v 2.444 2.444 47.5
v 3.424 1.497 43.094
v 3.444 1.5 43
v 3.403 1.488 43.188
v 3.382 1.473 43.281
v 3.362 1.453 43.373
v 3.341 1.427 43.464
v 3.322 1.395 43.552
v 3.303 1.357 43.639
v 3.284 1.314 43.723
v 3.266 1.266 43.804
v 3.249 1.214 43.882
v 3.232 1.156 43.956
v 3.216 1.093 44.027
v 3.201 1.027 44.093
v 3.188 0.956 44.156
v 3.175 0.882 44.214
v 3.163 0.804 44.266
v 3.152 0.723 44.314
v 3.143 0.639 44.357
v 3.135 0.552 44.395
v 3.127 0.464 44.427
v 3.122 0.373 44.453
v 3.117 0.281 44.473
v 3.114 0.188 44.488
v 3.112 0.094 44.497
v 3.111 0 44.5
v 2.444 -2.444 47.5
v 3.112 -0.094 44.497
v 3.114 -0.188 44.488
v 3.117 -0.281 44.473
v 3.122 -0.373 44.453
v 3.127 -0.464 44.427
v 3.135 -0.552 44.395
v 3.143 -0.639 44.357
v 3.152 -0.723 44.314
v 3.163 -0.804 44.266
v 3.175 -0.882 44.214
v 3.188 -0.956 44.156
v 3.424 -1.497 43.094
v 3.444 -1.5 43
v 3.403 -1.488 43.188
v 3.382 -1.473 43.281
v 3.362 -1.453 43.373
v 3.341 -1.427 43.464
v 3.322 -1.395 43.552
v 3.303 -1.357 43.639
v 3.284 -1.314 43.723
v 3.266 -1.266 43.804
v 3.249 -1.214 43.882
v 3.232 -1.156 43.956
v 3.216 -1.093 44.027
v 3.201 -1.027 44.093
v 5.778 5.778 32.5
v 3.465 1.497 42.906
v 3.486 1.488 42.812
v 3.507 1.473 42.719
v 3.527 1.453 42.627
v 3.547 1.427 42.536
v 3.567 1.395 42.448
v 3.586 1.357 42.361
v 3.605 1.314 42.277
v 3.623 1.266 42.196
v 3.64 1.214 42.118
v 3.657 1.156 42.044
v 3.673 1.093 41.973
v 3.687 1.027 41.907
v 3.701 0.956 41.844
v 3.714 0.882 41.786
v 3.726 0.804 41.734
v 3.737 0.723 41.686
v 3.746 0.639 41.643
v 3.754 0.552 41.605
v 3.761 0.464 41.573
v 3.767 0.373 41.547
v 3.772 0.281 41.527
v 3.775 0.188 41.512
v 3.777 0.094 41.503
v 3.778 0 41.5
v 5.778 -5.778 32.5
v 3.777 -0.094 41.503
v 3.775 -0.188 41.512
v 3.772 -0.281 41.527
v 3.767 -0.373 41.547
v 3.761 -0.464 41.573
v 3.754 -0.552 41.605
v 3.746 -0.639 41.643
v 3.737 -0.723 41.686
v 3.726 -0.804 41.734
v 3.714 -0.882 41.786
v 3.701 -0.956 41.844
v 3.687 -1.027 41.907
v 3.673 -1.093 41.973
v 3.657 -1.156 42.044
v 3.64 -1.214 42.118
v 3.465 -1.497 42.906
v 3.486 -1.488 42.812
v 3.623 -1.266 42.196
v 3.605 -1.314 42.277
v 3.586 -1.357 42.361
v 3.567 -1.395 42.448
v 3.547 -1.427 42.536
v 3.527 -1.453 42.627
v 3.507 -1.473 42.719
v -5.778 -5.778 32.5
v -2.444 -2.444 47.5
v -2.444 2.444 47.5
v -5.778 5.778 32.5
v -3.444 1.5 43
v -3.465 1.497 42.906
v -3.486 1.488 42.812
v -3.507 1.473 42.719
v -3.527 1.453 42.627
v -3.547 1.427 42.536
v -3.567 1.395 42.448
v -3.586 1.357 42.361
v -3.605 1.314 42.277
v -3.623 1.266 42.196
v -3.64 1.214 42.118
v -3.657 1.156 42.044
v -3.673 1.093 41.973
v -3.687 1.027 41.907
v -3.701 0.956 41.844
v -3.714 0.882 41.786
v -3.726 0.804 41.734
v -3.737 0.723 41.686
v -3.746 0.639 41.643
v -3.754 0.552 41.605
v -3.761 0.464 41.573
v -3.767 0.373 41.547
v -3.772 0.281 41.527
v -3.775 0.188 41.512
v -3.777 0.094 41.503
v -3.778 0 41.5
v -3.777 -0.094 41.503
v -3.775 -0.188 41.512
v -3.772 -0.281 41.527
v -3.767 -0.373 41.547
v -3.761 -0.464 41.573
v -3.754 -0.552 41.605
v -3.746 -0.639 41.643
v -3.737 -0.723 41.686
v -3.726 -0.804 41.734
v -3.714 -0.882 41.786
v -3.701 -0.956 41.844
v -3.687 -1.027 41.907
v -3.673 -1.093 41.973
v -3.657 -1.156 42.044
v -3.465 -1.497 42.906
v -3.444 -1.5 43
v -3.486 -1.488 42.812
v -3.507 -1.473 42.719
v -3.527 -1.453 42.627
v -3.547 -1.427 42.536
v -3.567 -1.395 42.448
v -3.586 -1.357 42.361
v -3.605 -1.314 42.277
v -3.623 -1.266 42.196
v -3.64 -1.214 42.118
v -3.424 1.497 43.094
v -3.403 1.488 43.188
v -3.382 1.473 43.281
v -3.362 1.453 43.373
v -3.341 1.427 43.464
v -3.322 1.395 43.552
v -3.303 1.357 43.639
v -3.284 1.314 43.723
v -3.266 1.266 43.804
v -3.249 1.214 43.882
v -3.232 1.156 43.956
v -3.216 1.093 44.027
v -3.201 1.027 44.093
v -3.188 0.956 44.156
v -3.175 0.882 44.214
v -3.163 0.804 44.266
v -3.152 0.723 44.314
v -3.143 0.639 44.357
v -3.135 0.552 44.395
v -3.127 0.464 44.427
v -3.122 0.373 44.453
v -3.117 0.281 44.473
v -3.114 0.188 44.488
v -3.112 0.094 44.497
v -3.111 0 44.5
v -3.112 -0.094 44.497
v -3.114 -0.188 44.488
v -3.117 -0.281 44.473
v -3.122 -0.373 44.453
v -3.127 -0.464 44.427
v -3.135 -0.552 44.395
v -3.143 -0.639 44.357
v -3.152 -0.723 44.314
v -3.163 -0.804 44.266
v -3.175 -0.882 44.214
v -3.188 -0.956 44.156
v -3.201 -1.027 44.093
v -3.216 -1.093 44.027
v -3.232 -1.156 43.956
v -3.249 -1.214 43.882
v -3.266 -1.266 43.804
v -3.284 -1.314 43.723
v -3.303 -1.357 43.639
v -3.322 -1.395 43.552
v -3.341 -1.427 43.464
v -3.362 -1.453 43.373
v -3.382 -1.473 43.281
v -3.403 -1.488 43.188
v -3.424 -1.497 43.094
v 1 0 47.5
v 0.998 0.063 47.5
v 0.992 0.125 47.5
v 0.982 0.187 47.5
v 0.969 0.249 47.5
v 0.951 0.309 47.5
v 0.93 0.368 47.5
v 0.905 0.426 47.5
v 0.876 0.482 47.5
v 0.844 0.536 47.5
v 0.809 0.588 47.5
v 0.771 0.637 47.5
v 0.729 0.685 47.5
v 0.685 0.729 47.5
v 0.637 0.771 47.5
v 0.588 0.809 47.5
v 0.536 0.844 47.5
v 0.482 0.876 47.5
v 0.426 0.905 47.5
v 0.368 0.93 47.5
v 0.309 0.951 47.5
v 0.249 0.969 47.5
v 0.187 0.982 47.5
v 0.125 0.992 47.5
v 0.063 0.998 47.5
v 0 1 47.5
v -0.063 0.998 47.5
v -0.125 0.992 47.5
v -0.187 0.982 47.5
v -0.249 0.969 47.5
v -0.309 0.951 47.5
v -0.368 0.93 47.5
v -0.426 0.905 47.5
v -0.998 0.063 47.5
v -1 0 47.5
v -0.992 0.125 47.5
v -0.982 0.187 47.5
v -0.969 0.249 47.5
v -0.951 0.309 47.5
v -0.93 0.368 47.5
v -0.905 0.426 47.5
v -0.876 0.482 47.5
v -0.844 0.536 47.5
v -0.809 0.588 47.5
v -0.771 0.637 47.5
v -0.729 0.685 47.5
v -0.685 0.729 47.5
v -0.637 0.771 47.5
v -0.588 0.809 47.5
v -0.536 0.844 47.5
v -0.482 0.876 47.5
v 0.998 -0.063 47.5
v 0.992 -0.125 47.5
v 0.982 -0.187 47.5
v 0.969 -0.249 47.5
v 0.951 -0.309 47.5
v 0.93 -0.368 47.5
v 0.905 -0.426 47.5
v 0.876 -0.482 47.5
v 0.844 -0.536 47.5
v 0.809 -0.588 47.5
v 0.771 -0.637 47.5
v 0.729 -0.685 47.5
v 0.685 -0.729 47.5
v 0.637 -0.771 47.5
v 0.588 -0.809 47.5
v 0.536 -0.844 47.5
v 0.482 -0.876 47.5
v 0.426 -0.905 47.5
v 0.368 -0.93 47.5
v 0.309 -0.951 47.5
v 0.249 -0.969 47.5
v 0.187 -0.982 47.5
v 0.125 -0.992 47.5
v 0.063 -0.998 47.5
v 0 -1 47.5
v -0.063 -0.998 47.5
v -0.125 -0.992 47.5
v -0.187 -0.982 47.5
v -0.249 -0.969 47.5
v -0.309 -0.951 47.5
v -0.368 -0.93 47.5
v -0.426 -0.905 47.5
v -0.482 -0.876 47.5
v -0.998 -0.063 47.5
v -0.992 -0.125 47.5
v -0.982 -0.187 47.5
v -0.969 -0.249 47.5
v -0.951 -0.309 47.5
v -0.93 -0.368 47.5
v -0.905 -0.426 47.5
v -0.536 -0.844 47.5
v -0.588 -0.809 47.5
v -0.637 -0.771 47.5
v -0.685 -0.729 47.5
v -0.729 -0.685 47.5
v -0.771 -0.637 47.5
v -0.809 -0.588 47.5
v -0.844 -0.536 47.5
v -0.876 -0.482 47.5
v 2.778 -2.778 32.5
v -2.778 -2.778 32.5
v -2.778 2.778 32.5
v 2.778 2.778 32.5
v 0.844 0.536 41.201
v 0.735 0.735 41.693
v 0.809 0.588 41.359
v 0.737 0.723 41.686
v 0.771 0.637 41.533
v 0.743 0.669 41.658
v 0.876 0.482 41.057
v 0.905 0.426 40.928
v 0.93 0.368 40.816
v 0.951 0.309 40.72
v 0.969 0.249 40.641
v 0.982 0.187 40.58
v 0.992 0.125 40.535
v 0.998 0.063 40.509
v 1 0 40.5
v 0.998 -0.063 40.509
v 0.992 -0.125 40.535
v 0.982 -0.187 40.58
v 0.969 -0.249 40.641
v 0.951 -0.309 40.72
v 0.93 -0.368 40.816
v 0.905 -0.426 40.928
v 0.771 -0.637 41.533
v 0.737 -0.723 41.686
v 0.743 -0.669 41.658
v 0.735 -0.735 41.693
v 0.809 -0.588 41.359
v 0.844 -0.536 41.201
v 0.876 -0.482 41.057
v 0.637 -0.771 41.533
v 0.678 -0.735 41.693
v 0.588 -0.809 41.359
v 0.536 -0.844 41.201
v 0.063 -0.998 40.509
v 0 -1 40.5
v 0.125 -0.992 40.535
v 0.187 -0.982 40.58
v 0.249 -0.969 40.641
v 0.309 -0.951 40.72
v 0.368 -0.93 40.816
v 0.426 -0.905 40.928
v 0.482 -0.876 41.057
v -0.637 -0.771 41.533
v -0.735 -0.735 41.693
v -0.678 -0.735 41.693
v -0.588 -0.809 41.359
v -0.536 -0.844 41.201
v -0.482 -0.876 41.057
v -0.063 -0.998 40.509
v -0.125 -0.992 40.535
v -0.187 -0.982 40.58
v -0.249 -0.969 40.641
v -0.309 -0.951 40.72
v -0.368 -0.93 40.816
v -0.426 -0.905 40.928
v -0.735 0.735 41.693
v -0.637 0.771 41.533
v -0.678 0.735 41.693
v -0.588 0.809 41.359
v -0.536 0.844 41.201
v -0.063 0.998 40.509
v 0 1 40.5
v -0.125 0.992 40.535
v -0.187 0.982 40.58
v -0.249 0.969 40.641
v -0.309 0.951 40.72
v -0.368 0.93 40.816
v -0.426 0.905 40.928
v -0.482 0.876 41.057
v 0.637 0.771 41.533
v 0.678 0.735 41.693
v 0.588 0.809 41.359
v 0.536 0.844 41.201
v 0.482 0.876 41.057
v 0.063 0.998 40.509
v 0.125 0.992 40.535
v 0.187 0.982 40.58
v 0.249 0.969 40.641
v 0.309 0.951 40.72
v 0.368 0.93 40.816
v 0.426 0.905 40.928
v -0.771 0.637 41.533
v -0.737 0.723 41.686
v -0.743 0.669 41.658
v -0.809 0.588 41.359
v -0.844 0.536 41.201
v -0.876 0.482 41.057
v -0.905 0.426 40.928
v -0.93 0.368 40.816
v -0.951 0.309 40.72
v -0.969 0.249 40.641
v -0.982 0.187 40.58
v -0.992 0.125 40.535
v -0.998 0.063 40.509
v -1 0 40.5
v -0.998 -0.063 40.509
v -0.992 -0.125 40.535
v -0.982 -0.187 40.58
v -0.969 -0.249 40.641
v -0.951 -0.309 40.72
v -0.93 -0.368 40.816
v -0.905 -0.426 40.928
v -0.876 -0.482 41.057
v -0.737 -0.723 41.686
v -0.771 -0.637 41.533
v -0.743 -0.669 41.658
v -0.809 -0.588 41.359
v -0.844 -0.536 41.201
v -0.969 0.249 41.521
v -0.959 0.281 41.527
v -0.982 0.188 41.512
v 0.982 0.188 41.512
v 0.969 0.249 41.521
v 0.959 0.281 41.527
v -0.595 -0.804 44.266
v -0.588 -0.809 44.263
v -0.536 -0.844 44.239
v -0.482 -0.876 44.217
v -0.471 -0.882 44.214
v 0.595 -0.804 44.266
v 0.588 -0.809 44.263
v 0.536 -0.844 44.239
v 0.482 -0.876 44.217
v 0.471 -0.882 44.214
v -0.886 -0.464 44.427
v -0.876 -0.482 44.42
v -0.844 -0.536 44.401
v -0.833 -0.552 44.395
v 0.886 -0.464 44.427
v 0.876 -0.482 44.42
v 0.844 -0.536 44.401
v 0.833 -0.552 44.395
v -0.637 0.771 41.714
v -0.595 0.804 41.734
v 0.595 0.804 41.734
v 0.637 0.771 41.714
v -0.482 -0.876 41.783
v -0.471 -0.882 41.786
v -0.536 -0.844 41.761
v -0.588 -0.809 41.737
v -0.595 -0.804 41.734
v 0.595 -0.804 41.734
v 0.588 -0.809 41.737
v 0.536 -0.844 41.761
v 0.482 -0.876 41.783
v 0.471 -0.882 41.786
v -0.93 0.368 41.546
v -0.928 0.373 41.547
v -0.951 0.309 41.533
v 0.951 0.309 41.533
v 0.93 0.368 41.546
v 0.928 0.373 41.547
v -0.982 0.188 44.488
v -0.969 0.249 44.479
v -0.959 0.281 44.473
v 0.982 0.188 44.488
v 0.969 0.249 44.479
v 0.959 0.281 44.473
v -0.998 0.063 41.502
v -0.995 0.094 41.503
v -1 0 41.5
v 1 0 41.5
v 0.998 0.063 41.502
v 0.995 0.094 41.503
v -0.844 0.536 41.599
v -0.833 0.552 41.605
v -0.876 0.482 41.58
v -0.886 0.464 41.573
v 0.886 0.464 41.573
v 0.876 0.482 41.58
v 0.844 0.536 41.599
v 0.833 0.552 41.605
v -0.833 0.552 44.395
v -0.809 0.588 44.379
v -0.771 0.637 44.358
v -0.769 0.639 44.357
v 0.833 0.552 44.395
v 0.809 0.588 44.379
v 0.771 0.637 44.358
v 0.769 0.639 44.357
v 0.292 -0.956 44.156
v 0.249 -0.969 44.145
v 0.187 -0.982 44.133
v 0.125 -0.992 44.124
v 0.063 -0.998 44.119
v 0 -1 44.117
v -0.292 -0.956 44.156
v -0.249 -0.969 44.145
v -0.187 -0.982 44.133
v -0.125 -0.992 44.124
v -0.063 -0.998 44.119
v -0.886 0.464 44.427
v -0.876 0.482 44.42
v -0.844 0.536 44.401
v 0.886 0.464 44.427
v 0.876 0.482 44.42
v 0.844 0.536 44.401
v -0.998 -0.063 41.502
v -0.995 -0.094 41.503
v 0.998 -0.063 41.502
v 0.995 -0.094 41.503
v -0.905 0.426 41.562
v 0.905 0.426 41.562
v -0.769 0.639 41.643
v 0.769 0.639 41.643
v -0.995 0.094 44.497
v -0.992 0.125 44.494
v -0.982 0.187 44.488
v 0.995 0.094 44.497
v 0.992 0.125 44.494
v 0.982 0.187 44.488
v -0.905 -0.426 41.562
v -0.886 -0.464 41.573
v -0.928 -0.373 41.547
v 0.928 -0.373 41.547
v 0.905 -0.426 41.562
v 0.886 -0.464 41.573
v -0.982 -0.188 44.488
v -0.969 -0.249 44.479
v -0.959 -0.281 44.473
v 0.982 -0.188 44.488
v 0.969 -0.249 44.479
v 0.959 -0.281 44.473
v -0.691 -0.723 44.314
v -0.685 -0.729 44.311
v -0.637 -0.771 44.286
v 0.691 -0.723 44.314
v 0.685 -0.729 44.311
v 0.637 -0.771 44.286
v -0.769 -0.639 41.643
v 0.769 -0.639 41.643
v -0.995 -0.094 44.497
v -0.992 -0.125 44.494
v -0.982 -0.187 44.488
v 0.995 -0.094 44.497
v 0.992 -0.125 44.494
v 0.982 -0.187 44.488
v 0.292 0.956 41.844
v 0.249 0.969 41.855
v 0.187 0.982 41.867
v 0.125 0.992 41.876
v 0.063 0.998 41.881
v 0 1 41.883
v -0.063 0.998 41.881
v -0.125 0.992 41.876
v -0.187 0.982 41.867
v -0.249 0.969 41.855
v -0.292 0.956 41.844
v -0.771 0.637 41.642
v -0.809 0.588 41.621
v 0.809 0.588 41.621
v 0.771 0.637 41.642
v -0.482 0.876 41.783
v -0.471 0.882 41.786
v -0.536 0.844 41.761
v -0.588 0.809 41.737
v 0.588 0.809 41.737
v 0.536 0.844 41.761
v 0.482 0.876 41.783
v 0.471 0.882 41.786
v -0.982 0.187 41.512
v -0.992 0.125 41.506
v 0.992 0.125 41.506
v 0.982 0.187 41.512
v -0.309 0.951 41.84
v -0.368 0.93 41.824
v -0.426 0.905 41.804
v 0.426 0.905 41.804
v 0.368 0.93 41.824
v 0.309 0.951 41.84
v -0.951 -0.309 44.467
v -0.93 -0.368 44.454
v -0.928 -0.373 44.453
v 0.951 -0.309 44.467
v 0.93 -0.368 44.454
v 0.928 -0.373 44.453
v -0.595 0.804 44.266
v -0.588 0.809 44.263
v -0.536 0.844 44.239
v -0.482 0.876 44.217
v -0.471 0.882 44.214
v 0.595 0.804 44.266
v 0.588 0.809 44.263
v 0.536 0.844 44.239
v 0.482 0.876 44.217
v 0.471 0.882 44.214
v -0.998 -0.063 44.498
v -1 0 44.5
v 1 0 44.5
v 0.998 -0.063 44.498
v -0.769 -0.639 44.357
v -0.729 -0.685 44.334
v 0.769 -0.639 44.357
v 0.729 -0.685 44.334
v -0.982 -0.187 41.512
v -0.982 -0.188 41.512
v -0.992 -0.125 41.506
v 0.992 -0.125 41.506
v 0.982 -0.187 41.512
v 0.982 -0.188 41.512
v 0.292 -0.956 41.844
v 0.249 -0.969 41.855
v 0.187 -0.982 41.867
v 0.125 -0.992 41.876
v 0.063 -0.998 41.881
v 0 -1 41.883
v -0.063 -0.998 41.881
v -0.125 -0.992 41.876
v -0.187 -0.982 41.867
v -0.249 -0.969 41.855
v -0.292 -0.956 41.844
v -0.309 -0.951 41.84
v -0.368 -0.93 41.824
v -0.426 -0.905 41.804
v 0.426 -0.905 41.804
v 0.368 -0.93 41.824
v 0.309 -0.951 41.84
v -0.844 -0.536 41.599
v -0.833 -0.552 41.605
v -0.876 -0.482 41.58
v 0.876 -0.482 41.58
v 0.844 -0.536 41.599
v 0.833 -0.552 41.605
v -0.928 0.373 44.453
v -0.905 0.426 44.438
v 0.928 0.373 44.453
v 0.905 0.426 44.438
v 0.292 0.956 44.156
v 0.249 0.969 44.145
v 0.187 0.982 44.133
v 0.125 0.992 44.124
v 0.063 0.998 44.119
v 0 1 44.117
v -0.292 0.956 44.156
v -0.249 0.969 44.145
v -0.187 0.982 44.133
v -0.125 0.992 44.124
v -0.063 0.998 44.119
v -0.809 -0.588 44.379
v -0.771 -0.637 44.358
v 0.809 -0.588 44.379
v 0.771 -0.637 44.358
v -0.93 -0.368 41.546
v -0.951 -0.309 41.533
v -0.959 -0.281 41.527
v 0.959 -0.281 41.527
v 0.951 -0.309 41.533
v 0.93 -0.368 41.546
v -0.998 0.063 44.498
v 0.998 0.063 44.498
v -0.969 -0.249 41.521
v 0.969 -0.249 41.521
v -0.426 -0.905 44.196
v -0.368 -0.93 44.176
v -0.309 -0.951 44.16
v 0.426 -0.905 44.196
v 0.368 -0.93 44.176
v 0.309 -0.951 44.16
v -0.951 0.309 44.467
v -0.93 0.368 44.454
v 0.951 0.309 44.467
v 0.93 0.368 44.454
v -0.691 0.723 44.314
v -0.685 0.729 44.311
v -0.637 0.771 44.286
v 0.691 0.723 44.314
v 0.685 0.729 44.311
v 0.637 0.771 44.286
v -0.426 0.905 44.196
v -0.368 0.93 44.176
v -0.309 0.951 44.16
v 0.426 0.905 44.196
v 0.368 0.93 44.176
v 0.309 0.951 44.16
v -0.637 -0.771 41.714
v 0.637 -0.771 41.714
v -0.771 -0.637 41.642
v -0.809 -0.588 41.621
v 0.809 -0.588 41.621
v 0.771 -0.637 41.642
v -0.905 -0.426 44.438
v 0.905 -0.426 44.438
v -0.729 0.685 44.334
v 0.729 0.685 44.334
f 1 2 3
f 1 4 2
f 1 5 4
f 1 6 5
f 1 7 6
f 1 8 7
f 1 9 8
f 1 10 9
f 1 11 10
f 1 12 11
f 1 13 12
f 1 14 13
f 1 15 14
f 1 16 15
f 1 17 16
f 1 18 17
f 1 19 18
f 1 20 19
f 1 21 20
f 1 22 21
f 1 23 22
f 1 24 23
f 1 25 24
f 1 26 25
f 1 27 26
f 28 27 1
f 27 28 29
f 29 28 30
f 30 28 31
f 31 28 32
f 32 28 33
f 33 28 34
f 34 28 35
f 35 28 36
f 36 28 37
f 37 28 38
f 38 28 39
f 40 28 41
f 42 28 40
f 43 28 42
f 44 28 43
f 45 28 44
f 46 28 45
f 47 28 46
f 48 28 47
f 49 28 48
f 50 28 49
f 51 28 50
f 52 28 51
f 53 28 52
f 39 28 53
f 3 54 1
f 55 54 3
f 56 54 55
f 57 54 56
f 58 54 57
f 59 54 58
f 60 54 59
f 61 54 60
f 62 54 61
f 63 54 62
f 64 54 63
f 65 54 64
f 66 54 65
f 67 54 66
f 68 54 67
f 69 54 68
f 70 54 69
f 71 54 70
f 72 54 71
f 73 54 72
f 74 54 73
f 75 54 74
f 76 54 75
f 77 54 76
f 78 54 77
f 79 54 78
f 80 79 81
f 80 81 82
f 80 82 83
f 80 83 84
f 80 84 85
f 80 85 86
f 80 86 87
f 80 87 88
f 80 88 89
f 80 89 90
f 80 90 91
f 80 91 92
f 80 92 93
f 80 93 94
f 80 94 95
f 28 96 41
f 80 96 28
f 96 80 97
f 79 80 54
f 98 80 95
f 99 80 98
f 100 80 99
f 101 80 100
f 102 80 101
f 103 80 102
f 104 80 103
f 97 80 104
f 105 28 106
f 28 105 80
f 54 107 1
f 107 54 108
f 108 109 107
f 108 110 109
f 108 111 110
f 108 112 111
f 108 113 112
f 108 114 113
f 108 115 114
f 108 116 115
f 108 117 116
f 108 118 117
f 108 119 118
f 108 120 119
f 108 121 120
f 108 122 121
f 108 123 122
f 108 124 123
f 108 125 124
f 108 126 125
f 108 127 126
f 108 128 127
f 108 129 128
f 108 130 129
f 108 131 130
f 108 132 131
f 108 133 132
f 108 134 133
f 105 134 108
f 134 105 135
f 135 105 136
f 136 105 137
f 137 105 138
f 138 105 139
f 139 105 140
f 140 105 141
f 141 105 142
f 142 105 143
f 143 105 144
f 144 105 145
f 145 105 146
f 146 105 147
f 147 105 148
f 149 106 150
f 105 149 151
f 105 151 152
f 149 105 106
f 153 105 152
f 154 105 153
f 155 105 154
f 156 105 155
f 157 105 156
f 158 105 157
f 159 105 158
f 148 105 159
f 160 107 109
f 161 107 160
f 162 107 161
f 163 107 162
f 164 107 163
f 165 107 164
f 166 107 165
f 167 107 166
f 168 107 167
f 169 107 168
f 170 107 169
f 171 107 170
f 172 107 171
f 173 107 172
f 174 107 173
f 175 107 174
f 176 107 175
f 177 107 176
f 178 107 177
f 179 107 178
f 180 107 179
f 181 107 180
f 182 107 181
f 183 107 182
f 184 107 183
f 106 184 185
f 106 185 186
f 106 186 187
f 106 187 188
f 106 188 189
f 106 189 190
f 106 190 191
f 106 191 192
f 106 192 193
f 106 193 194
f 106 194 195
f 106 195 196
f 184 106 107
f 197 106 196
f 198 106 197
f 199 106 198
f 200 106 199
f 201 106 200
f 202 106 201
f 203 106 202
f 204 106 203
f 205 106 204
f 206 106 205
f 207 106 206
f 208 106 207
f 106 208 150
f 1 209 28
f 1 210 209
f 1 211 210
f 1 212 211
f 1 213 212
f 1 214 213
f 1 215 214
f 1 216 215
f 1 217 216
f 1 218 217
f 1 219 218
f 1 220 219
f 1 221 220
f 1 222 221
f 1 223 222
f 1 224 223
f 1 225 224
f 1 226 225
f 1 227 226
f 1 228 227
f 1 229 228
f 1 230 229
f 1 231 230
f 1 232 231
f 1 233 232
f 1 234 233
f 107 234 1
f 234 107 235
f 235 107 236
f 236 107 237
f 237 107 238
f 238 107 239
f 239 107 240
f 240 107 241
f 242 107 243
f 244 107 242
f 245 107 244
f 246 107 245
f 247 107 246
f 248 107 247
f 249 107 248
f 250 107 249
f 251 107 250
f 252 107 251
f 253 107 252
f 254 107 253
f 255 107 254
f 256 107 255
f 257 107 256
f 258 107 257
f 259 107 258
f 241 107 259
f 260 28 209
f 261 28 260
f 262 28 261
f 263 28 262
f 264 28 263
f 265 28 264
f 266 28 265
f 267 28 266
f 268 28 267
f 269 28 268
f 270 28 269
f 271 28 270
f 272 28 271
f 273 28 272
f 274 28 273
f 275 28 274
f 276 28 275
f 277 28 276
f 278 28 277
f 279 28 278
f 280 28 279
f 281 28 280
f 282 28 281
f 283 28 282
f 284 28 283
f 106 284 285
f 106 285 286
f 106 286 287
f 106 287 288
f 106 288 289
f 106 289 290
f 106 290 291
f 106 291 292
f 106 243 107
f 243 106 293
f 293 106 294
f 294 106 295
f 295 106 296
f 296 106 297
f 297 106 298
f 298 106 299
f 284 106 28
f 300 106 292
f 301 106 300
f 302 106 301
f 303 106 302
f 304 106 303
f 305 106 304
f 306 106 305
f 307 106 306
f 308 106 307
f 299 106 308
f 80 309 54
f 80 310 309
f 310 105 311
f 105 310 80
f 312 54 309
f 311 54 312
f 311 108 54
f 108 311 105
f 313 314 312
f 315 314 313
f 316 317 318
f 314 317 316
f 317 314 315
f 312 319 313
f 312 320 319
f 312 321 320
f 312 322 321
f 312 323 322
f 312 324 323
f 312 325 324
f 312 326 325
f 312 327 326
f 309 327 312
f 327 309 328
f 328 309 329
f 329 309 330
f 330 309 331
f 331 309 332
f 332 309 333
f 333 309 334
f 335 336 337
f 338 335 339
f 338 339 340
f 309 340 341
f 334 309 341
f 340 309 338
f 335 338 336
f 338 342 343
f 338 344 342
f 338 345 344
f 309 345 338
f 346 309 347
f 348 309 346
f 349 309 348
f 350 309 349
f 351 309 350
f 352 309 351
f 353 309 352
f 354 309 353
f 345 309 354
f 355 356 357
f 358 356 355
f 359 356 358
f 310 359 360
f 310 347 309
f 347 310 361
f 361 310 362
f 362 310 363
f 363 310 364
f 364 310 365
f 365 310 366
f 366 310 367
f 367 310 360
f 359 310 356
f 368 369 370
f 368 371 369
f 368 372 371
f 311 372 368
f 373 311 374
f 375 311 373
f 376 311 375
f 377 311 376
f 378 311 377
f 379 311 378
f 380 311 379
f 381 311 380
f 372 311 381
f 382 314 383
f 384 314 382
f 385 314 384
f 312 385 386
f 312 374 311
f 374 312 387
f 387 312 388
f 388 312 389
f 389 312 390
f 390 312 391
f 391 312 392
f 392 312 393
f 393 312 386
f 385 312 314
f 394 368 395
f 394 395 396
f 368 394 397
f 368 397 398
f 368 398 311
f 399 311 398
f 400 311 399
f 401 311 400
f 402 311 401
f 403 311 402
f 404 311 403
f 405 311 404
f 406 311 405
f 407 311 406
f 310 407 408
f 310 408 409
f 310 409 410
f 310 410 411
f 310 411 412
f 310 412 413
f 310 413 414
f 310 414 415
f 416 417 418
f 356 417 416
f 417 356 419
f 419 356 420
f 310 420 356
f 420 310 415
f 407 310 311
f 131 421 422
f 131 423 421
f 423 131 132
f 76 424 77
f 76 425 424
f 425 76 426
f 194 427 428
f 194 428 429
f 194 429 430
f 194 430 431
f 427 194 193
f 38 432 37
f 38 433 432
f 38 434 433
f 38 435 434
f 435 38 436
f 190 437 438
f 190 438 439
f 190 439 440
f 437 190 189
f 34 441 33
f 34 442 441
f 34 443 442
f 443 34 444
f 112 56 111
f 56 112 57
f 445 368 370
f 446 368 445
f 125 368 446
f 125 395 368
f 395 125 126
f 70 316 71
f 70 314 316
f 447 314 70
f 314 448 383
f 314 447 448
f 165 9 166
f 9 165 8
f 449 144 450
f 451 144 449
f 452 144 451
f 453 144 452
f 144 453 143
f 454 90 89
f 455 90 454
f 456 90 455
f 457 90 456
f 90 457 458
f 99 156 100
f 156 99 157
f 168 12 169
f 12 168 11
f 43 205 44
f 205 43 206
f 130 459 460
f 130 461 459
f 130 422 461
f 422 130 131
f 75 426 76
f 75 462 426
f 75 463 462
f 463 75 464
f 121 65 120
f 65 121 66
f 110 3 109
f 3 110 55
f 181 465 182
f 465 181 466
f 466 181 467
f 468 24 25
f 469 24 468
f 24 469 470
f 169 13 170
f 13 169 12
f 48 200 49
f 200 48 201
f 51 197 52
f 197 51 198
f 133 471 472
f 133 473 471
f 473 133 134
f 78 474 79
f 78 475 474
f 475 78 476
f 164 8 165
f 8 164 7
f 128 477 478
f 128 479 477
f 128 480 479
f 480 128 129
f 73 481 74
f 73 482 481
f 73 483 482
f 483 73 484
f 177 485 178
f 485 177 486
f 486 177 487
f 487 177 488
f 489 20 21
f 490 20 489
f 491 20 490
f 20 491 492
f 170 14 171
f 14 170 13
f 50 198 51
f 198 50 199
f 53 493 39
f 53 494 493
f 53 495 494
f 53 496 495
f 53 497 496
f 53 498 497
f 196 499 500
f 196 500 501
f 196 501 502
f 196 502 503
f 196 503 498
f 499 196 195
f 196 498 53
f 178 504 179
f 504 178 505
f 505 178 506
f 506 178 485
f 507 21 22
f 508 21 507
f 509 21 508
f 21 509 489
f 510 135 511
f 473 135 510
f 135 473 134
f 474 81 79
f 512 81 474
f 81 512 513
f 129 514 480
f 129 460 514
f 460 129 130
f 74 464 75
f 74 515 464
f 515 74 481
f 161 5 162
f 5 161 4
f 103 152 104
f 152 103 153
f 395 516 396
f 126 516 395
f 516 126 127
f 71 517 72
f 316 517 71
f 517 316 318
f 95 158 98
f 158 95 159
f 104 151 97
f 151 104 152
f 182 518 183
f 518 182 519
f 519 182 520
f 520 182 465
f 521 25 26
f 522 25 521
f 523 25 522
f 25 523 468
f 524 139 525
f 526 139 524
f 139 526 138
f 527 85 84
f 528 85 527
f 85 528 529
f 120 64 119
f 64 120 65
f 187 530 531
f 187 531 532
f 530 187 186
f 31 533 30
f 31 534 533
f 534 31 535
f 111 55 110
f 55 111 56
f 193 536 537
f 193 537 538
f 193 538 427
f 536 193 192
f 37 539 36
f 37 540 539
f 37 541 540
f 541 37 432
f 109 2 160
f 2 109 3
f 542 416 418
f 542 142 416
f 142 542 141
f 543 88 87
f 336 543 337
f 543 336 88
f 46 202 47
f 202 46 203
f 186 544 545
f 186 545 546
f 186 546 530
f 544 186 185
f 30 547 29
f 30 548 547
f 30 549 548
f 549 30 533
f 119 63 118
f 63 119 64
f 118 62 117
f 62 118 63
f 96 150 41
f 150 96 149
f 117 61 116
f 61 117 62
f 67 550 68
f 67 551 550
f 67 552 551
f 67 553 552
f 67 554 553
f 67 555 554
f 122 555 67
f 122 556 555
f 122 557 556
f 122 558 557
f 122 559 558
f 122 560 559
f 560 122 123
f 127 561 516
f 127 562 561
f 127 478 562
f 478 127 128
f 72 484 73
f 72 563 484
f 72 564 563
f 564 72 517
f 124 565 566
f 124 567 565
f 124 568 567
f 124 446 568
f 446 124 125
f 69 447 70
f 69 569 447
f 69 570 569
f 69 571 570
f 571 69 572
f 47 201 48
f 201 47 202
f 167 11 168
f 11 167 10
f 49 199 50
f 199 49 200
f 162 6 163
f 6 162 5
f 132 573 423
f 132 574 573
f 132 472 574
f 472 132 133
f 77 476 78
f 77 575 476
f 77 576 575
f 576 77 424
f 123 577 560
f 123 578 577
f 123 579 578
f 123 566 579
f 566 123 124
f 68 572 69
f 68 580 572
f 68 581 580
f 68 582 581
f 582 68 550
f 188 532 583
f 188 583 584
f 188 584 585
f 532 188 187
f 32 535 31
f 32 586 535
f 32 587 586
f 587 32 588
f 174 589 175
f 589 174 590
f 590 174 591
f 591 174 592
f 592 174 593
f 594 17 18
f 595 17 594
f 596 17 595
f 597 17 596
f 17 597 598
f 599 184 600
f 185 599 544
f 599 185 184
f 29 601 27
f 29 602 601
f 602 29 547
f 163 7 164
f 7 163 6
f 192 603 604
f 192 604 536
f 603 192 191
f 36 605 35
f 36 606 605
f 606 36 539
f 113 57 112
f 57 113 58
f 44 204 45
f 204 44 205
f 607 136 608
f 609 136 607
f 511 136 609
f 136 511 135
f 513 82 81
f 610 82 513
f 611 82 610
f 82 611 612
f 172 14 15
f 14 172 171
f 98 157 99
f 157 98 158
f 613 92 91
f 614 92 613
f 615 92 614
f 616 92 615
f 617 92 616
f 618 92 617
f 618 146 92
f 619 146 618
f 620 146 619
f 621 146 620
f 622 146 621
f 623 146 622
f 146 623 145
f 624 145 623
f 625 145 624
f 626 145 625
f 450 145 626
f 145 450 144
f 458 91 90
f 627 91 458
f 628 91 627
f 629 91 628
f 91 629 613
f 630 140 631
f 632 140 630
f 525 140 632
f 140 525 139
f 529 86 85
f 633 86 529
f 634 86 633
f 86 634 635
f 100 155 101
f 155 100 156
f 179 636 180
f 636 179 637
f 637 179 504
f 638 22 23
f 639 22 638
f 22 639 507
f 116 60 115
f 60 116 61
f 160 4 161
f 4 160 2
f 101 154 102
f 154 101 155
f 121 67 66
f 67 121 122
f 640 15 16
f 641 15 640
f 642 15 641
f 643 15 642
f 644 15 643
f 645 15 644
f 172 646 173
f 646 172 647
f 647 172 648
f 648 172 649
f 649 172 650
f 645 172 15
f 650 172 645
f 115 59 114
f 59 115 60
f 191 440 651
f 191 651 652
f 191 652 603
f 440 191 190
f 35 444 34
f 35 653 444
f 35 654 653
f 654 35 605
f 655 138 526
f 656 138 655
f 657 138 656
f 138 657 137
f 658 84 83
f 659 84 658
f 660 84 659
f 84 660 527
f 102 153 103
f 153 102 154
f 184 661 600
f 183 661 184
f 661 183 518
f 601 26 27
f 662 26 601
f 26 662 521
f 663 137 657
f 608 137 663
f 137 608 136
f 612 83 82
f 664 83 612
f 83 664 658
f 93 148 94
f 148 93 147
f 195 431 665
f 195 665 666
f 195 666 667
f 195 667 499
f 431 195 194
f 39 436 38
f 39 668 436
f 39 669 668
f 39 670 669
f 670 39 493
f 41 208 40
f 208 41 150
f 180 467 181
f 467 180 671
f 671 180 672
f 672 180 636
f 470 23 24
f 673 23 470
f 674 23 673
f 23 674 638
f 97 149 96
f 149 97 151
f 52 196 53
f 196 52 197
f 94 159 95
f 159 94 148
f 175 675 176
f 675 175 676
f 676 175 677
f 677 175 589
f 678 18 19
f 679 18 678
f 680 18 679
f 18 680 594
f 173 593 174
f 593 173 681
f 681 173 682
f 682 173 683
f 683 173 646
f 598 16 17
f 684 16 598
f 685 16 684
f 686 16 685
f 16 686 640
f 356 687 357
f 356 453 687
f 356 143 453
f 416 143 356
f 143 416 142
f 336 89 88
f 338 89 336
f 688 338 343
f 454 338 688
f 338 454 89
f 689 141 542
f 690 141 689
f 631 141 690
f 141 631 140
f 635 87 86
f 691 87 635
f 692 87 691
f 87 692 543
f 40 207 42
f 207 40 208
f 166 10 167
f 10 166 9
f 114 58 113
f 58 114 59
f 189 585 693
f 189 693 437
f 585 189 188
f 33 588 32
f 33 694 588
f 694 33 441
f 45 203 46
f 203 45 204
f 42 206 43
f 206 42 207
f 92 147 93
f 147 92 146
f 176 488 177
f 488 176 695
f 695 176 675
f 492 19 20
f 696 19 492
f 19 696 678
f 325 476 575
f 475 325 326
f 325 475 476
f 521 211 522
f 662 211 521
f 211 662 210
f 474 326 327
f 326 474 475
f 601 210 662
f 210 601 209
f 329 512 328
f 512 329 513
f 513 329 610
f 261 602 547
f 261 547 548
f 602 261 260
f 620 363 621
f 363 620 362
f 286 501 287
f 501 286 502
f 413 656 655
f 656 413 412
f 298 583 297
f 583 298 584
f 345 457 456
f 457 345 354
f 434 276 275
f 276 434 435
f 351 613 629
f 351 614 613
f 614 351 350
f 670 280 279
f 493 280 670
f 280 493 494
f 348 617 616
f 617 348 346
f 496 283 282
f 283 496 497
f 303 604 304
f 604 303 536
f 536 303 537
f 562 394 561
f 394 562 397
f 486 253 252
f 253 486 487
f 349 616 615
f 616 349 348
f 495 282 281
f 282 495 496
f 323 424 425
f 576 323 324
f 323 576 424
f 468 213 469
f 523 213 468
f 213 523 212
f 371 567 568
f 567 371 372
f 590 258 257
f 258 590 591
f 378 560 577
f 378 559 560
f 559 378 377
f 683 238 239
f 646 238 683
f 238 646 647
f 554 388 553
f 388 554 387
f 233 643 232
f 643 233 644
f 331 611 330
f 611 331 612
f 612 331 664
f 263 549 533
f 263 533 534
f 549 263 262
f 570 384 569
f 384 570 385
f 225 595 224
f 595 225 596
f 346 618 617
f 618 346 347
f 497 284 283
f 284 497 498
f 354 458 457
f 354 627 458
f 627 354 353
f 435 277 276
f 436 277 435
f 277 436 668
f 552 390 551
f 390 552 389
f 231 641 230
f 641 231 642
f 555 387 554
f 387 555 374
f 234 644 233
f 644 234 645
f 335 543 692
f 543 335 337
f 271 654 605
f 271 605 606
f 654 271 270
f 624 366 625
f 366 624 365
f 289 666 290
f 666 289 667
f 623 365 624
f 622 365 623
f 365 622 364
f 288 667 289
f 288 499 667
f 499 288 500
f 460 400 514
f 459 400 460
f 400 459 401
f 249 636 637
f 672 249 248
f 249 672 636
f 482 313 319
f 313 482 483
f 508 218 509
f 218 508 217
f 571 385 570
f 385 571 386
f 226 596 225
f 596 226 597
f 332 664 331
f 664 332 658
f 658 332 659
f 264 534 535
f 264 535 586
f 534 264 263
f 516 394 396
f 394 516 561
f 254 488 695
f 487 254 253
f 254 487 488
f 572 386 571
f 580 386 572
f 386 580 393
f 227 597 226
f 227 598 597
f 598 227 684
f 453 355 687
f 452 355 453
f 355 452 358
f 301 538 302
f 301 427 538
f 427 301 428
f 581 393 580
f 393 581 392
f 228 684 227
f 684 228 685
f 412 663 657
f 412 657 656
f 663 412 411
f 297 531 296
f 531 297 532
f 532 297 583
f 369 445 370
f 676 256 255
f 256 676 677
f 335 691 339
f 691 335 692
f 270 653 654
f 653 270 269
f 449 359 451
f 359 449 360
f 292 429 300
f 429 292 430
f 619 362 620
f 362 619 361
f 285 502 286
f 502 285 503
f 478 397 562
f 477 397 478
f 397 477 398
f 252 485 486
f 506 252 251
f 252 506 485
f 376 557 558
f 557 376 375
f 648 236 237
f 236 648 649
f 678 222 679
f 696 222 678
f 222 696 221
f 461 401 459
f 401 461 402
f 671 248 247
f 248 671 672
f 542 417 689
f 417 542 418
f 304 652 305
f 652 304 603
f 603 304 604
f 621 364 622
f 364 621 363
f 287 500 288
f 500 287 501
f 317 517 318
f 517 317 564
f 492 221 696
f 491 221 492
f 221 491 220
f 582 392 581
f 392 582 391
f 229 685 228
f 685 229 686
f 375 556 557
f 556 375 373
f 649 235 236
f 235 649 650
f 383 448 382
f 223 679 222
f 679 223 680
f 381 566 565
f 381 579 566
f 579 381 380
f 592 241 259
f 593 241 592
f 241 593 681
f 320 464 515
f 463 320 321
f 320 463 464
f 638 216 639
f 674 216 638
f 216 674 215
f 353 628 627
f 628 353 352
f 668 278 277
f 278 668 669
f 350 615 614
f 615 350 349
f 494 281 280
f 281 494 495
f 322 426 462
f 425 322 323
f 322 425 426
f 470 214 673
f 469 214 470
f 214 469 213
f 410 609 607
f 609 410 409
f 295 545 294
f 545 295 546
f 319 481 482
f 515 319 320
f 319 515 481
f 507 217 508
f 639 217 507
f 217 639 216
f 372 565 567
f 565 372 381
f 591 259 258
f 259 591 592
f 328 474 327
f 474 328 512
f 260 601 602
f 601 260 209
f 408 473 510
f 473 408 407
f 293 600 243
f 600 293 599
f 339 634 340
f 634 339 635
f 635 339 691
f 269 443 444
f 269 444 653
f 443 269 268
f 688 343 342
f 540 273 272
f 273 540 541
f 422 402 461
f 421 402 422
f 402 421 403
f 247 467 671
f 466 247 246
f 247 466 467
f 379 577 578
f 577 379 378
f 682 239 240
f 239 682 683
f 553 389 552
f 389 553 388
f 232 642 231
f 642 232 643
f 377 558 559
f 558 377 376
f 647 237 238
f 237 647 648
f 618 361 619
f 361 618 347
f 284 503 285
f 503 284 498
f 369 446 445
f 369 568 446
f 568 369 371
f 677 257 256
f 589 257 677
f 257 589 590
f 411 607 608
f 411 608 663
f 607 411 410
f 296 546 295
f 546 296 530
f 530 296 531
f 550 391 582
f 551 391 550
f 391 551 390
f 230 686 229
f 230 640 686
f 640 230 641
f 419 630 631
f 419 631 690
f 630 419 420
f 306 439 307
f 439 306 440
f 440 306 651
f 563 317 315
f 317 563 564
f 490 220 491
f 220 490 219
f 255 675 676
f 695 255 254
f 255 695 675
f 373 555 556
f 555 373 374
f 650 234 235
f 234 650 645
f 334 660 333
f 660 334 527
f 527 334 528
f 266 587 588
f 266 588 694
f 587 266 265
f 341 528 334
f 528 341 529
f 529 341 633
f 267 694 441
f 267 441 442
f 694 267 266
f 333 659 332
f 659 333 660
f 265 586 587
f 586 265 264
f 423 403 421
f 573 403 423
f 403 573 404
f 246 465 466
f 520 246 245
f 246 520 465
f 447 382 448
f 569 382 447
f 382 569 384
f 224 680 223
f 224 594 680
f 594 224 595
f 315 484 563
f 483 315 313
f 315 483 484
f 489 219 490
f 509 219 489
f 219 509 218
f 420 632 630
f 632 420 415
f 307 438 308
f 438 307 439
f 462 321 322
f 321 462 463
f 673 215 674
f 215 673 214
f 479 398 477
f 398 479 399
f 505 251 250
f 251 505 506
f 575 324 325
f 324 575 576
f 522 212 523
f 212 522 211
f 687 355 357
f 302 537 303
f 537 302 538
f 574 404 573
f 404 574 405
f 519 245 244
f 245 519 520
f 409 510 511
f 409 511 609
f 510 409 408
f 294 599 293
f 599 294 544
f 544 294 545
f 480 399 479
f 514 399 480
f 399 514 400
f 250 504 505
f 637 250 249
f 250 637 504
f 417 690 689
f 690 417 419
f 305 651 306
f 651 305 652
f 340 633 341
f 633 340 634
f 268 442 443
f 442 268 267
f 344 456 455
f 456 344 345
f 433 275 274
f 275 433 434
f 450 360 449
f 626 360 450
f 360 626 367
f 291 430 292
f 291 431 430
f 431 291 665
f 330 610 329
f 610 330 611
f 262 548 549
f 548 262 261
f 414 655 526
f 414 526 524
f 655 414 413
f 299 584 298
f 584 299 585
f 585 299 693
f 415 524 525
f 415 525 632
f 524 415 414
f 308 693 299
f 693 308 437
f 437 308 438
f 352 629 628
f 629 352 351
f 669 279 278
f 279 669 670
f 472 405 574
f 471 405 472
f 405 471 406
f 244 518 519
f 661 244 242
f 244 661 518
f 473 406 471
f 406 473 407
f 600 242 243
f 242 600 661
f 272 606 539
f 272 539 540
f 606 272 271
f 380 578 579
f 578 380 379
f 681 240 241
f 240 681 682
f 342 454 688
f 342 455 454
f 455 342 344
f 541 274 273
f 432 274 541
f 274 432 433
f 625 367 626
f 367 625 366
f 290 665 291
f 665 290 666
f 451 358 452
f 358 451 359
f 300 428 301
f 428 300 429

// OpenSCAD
// file: KlaudiaHairPendantHalf.scad
module PyramidPrimitive()
{
   polyhedron(
  points=[ [10,10,0],[10,-10,0],[-10,-10,0],[-10,10,0], // the four points at base
           [0,0,45]  ],                                 // the apex point 
  faces=[ [0,1,4],[1,2,4],[2,3,4],[3,0,4],              // each triangle side
              [1,0,3],[2,1,3] ]                         // two triangles for square base
 ); 
}

module KlaudiaHairPendant()
{
    difference()
    {
        
       union()
       {
           intersection()
           {
               union()
               {
                    PyramidPrimitive();
                    scale([1,1,0.3]) mirror([0,0,1])PyramidPrimitive();
               }
               cube(79.1,center=true);
           }
            // This part is broken off after the part is printed.   
            translate([0,0,40]) cylinder(d=30,h=1,center=true);
       } 
       difference()
       {
           translate([0,0,-14]) cube(5,center=true);
       } 
       // This hole through the length of this pendant ensures the resin drains out as it is printed. 
       cylinder(d=2,h=200,$fn=100,center=true);
    }
}

module KlaudiaHairPendantCap()
{
    difference()
    {
        intersection()
        {
            scale([1.3,1.3,1.3])PyramidPrimitive();
            translate([0,0,40]) cube([15,15,15],center=true);
        }
        PyramidPrimitive();        
        translate([0,0,43]) rotate([0,90,0]) cylinder(d=3,h=200,$fn=100,center=true);
        // This hole through the length of this pendant ensures the resin drains out as it is printed. 
        cylinder(d=2,h=200,$fn=100,center=true);
    }
}

//KlaudiaHairPendant();
//KlaudiaHairPendantCap();
// main file
include <KlaudiaHairPendantHalf.scad>;

KlaudiaHairPendantCap();
